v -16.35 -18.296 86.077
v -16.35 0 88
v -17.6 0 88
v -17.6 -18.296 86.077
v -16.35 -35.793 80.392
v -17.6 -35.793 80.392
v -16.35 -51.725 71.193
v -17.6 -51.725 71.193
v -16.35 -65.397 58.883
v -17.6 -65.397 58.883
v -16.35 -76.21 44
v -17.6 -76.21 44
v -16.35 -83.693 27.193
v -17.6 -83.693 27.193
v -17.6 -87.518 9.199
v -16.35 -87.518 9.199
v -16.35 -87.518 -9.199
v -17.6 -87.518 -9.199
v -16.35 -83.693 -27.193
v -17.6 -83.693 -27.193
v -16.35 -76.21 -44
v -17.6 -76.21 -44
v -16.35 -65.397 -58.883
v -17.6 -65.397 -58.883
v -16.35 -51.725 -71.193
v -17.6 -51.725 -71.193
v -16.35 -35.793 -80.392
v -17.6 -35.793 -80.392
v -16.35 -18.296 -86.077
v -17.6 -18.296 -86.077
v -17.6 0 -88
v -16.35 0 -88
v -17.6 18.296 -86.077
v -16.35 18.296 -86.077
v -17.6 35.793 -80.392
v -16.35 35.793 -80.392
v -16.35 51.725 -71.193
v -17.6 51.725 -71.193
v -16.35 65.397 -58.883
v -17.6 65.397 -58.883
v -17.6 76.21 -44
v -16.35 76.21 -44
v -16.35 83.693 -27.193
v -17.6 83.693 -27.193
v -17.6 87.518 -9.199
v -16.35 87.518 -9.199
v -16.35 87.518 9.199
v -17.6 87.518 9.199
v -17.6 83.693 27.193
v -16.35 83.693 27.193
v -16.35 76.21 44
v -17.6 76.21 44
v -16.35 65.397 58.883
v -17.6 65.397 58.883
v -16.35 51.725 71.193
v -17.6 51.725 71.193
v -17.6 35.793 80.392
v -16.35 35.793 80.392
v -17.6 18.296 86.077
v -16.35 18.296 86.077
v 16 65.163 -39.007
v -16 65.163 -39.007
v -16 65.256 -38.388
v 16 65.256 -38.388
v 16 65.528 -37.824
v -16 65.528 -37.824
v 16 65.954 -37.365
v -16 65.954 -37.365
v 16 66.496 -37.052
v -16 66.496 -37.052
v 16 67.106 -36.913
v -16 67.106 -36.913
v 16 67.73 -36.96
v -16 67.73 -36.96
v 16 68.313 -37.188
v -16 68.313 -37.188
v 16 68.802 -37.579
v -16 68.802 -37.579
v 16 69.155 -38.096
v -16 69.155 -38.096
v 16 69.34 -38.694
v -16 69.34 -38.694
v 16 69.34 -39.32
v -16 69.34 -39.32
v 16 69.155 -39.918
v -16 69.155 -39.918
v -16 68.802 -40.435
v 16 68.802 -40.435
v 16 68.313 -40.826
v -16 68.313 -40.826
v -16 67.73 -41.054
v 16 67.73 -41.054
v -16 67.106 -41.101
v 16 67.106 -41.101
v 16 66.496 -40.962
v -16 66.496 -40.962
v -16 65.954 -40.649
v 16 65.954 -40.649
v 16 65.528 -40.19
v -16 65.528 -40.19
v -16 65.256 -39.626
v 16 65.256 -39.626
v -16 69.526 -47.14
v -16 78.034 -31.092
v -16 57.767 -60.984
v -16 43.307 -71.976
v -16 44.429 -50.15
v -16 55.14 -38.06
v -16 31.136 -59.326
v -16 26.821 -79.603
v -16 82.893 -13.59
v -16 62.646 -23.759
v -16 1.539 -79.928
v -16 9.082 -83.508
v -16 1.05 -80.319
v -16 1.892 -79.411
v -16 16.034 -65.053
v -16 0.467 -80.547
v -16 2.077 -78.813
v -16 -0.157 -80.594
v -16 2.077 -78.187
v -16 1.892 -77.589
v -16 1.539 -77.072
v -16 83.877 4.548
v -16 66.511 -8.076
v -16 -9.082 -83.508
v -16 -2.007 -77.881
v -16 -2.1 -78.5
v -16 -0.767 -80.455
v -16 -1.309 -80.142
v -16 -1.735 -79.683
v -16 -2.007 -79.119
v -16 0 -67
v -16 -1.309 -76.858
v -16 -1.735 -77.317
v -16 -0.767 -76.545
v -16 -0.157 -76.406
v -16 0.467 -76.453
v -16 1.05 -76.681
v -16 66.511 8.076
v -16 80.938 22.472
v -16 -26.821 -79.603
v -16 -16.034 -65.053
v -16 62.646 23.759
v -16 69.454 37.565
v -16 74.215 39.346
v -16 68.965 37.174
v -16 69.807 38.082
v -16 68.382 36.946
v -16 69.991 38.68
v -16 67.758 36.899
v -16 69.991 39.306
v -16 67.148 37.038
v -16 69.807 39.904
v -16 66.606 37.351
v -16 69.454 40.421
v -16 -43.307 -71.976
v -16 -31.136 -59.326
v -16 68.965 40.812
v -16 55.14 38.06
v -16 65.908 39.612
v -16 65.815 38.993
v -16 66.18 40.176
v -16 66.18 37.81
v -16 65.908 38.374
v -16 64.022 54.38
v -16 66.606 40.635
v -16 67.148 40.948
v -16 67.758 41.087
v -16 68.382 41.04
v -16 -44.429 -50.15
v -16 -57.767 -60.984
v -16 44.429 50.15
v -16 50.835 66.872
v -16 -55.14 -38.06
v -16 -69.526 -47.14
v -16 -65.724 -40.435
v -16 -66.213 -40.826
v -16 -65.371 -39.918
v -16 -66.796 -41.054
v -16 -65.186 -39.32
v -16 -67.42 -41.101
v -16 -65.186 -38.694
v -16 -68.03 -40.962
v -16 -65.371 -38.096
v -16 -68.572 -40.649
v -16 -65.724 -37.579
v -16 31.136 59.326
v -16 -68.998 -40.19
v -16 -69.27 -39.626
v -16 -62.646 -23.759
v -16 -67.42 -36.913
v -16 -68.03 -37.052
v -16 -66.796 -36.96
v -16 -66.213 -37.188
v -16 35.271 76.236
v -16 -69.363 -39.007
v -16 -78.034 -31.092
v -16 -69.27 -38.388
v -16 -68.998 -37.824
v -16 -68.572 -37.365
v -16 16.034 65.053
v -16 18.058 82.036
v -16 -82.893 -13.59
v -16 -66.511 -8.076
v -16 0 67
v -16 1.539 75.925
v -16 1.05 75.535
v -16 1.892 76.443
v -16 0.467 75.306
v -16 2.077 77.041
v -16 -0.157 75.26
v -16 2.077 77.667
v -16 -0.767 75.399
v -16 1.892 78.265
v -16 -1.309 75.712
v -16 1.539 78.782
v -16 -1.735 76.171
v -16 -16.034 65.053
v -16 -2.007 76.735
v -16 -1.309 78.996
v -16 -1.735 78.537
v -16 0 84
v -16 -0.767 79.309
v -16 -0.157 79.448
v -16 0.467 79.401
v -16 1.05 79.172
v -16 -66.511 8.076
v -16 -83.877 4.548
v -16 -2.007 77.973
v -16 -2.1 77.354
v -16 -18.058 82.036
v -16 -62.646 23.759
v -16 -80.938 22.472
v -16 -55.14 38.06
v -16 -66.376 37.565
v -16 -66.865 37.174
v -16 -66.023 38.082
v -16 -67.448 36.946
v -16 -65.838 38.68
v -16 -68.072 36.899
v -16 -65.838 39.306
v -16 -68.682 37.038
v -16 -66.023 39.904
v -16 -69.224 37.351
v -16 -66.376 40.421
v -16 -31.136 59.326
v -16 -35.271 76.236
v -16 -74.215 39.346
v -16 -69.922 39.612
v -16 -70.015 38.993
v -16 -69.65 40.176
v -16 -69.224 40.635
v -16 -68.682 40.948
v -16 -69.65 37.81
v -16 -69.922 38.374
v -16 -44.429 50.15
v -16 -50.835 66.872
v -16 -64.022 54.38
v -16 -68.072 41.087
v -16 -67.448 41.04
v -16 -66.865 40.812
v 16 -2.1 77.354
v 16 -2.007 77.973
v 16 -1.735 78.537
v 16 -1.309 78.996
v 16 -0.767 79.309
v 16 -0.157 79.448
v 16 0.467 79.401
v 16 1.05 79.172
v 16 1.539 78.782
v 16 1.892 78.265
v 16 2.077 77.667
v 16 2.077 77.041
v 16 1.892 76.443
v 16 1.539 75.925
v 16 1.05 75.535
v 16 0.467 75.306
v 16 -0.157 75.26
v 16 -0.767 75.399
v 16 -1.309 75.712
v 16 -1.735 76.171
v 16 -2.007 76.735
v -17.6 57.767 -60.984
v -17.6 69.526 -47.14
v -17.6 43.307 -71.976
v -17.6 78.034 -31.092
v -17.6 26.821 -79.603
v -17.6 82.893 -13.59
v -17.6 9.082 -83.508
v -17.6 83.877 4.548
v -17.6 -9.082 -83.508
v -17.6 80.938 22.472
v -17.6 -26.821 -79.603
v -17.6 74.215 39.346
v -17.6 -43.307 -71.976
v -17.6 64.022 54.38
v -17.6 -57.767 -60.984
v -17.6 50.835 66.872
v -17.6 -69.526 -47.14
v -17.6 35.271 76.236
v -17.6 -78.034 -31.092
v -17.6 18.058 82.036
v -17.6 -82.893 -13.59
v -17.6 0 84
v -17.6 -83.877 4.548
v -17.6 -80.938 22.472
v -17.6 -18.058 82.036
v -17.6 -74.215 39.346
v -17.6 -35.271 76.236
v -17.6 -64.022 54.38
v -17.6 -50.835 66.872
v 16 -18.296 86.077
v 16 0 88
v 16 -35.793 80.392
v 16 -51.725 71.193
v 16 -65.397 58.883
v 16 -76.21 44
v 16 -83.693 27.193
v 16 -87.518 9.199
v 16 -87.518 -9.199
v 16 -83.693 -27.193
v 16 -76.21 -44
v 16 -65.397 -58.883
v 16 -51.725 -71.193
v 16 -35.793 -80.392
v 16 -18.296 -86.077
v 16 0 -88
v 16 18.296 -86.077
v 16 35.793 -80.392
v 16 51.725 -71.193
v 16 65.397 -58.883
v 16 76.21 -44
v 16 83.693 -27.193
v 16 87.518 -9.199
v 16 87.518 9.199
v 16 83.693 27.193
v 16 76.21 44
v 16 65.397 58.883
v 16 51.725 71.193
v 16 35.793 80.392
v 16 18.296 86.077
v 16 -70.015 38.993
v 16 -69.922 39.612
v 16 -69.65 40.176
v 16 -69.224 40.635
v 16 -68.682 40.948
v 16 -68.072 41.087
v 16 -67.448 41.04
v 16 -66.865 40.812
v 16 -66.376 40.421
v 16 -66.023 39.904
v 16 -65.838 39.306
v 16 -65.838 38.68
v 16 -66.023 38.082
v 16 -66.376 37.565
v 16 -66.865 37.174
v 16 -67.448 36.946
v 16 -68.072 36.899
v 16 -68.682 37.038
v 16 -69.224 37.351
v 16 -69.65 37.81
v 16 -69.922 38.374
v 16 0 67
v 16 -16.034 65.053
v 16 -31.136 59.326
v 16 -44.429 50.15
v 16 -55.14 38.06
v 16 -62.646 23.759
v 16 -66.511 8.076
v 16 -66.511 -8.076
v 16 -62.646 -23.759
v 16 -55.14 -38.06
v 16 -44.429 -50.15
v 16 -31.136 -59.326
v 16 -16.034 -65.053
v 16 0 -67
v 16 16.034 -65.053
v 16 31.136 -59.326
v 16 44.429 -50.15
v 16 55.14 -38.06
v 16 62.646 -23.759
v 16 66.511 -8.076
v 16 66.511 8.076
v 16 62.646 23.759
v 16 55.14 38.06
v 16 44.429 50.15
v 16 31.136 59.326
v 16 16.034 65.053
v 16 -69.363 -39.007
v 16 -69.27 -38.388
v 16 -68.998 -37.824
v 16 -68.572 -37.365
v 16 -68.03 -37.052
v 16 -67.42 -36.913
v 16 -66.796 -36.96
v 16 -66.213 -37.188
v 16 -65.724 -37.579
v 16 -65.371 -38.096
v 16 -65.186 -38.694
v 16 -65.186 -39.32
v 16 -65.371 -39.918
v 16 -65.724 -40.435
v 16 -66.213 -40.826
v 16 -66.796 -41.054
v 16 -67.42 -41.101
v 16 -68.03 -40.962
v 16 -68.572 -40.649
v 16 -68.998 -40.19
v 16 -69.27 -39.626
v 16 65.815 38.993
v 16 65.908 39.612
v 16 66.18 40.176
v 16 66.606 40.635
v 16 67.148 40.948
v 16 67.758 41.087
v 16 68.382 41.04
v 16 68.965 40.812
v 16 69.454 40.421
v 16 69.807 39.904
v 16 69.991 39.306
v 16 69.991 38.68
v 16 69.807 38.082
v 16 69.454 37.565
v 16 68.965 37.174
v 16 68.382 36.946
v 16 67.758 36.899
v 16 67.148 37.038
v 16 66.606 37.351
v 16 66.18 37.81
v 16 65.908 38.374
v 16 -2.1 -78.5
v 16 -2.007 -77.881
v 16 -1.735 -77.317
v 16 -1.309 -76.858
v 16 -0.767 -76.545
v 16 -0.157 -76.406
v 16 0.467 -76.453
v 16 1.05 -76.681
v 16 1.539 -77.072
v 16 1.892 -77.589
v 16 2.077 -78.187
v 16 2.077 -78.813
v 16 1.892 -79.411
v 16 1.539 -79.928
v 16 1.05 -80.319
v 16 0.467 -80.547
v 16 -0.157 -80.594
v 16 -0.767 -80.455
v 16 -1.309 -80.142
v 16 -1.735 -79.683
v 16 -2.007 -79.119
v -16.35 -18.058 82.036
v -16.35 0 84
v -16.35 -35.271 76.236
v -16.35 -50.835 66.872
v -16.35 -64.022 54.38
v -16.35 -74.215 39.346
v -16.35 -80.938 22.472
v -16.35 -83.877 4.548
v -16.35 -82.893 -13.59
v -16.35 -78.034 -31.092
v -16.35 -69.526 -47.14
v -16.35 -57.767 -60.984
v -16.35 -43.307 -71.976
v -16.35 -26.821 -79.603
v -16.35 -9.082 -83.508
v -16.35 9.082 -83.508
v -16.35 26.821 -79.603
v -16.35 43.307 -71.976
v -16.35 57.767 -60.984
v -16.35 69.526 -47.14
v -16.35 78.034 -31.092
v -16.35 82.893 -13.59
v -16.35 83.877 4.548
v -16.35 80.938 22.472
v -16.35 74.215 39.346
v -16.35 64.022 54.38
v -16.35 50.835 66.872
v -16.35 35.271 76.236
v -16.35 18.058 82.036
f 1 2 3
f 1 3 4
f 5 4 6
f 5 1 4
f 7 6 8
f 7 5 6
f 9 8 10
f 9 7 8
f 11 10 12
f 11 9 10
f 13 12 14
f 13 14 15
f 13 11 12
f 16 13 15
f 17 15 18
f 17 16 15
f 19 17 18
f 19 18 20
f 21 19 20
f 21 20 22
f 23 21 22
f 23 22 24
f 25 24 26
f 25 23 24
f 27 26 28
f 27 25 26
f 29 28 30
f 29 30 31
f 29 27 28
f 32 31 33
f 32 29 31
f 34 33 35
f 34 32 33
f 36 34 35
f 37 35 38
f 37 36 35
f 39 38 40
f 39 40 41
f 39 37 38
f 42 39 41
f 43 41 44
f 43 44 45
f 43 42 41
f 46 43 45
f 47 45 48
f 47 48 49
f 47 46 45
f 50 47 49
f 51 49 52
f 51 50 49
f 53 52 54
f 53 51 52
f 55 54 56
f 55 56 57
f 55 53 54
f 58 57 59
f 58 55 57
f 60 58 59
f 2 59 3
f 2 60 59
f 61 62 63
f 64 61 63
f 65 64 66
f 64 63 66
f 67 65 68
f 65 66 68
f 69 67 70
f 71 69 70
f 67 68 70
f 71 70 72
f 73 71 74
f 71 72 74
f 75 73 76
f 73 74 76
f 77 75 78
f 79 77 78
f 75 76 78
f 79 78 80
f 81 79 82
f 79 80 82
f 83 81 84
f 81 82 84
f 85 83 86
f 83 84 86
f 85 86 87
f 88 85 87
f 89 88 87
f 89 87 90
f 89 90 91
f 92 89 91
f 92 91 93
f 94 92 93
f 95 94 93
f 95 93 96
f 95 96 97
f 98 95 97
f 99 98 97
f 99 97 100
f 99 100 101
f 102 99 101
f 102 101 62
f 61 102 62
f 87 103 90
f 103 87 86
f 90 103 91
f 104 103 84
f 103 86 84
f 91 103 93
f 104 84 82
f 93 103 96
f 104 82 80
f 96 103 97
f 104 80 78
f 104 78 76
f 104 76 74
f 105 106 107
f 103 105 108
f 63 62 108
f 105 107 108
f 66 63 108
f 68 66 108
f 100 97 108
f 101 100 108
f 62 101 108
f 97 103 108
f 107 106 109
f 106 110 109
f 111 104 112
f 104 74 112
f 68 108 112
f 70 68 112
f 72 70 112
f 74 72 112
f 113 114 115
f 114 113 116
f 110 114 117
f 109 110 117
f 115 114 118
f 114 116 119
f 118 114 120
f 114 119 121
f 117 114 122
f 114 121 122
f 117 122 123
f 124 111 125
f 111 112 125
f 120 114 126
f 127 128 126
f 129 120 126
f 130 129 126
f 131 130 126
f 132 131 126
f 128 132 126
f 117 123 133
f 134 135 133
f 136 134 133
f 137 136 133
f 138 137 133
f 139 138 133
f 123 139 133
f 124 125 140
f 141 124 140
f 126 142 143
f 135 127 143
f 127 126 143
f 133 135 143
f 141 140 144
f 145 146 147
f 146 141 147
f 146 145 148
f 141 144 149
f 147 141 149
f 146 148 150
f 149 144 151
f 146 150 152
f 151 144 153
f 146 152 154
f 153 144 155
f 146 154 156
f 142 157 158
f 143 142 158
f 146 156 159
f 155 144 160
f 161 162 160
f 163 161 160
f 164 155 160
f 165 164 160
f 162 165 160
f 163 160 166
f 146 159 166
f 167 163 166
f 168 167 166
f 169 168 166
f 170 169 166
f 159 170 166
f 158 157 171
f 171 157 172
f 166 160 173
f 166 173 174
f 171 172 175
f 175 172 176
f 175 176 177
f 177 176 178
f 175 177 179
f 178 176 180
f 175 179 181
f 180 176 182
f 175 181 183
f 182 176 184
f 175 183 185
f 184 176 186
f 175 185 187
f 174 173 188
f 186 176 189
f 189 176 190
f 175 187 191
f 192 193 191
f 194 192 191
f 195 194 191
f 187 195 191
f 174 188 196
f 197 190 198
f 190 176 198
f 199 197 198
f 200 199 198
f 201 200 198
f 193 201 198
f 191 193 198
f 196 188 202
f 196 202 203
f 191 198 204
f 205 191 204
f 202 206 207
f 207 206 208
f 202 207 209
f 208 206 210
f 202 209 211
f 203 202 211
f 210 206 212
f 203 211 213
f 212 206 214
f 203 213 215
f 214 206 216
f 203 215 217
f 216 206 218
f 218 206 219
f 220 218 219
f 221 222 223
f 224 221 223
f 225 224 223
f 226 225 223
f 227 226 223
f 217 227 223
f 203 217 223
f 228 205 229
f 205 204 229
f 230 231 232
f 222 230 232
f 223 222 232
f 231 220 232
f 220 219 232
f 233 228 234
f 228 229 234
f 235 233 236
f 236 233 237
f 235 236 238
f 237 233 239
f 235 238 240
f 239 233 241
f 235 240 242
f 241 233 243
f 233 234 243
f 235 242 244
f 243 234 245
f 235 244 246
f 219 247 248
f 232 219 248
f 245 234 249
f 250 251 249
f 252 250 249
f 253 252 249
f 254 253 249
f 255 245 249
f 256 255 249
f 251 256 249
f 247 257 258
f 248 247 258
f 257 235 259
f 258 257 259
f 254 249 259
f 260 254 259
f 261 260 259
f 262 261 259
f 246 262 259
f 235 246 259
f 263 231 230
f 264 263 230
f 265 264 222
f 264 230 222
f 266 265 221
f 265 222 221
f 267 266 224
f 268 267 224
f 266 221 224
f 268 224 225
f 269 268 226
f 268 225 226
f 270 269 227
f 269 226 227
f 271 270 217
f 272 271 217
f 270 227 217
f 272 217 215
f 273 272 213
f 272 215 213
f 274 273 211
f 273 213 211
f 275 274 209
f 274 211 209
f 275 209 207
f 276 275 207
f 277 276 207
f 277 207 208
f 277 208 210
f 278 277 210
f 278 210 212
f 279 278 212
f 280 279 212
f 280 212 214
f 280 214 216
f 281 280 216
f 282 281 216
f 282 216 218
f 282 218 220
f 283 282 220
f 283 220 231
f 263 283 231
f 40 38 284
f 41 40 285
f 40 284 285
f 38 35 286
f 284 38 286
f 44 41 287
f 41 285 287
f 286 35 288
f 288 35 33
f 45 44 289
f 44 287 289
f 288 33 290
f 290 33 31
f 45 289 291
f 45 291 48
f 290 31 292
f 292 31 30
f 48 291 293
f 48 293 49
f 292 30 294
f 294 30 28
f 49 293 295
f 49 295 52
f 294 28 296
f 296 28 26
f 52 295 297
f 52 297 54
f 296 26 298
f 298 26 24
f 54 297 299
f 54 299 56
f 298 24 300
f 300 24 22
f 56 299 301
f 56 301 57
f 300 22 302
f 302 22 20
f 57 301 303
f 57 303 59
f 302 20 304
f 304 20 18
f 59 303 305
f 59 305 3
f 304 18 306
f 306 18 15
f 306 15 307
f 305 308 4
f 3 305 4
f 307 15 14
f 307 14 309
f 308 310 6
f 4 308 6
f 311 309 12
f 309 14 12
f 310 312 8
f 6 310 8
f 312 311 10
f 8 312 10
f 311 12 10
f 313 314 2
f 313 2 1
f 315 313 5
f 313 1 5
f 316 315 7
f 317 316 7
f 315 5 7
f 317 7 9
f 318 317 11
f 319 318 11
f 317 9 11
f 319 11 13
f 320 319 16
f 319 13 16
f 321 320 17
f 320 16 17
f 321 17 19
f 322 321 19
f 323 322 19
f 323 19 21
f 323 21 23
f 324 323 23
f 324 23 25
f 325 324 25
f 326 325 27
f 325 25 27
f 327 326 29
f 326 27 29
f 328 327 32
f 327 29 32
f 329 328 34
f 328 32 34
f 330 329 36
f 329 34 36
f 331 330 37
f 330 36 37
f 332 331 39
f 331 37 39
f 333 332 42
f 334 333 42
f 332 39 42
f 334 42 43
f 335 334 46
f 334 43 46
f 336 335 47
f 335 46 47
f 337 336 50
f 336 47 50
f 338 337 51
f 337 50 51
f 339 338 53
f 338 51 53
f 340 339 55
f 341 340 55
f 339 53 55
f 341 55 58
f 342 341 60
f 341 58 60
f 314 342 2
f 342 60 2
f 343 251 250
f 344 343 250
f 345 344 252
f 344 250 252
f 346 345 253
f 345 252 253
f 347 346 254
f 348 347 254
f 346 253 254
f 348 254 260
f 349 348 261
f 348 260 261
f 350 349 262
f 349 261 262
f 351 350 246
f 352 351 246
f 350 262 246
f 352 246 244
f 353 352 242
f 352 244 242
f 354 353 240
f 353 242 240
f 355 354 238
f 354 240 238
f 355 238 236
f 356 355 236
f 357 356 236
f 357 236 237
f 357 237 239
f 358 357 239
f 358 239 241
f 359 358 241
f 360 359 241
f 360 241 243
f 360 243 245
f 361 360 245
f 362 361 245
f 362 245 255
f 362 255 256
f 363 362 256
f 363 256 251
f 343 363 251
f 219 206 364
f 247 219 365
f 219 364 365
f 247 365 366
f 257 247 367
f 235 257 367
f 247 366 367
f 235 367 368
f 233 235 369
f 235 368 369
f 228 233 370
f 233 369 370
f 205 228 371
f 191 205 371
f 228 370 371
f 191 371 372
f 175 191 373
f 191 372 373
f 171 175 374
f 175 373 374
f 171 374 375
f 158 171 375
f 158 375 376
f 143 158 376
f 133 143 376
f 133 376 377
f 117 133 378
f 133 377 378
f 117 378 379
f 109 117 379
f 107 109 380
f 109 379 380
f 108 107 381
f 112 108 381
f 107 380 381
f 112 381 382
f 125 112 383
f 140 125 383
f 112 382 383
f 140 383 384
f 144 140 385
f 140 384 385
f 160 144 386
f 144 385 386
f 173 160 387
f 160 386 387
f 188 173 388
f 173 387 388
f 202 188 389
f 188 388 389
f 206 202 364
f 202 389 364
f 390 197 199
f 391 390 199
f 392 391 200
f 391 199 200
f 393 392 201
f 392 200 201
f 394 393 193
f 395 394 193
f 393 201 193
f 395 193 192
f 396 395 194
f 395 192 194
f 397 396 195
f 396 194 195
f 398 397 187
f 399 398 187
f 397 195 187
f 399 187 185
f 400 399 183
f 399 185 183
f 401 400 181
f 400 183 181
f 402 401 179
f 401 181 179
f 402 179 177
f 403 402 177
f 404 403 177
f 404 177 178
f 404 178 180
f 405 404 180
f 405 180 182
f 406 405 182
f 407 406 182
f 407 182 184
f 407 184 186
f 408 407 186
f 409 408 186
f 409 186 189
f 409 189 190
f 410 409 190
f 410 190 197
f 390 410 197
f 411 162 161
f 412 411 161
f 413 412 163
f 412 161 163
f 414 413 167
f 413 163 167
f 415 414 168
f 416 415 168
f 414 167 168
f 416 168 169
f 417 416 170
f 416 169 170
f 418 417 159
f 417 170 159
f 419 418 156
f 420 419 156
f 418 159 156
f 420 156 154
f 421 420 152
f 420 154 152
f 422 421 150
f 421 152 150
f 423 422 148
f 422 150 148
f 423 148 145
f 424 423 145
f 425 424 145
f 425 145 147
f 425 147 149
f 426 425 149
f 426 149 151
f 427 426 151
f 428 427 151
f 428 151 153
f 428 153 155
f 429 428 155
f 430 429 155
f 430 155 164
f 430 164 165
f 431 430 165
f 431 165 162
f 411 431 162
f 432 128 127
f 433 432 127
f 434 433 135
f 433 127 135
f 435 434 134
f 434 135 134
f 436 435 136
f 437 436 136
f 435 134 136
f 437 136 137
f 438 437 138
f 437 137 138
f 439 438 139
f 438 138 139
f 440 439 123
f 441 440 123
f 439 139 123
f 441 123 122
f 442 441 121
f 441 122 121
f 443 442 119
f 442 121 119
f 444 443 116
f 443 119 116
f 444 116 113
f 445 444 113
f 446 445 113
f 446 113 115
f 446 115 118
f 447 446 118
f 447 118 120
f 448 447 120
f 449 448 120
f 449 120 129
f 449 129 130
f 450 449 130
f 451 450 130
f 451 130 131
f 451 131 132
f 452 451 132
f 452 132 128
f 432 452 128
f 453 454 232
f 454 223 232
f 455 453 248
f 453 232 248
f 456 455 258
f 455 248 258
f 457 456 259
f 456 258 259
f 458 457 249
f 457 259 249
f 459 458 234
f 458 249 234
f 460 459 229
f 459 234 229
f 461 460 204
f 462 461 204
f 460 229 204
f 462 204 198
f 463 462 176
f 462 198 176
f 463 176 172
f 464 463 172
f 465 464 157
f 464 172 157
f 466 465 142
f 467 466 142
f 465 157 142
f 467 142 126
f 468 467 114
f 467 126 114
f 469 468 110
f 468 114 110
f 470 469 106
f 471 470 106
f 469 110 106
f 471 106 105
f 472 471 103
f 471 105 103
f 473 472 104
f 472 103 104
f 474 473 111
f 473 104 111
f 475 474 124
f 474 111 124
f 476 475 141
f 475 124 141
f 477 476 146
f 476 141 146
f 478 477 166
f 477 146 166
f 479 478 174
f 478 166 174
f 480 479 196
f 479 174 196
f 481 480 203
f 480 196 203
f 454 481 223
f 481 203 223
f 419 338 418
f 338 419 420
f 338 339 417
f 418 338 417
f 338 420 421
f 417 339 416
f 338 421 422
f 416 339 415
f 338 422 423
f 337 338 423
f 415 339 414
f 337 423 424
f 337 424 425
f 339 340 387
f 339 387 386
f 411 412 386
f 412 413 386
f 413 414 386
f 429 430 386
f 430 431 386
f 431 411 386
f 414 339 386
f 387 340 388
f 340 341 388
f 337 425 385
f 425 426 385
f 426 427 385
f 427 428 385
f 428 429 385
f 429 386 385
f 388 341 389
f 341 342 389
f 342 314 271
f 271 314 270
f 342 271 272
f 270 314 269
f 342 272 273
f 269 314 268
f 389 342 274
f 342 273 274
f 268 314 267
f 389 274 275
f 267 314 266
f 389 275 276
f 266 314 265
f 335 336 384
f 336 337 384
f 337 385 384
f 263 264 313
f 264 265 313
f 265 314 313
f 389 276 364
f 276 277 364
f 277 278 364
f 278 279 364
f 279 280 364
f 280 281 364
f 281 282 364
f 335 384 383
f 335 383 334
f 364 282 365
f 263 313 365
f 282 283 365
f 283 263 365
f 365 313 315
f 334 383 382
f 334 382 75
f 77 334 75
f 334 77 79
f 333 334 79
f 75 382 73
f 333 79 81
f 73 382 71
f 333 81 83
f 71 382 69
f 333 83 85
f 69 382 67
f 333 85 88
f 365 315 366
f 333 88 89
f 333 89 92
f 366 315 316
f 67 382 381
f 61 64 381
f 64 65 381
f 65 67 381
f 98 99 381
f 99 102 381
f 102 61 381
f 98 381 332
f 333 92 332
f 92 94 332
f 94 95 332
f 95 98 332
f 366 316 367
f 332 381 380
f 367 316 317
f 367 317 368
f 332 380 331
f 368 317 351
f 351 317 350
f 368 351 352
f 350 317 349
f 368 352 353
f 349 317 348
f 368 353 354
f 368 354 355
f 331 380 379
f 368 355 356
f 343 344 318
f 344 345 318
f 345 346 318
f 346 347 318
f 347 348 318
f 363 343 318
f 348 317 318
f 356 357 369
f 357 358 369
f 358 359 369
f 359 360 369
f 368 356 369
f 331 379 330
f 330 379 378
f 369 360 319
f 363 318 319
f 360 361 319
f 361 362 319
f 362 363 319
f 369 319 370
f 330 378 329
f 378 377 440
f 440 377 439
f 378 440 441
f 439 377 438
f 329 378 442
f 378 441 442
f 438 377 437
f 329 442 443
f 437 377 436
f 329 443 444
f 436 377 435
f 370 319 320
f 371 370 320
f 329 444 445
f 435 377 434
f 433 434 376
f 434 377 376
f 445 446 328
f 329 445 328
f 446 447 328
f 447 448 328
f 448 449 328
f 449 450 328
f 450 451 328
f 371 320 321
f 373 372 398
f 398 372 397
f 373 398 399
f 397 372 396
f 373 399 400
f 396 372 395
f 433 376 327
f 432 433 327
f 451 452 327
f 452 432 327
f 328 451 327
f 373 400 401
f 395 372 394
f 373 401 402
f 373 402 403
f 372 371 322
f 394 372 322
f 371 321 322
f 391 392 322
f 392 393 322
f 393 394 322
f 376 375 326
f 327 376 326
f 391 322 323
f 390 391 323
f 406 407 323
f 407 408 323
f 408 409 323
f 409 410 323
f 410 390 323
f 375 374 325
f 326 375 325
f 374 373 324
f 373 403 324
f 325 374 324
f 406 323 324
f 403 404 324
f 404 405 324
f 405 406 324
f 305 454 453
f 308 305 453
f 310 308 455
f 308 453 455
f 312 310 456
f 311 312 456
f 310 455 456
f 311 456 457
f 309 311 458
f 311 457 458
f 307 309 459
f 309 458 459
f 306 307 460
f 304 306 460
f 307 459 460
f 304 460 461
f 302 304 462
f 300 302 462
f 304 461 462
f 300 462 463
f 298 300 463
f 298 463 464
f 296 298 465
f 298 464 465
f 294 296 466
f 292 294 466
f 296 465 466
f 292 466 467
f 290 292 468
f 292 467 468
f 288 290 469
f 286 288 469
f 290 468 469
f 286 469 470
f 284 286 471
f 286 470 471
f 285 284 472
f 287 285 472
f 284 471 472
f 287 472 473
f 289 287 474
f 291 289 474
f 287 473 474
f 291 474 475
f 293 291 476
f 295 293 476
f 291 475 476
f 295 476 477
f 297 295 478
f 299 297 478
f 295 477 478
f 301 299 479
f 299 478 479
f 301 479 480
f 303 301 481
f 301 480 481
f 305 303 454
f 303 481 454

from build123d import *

# Parameters (mm, degrees)
F2_DEPTH = 0.7
F3_DEPTH = 0.35
F5_D     = 4.2
F6_DEPTH = 1.25


with BuildPart() as f1:
    # F0 (on Front) → F1 (revolve)
    with BuildSketch(Plane.XZ):
        Polygon((-16, 84), (-16, 67), (16, 67), (16, 84), (16.35, 84), (16.35, 88), (-16.35, 88), (-16.35, 84), align=None)
    revolve(axis=Axis((-7.2666932824, 0, 0), (1, 0, 0)))

    # F2 (cut): a face of the model
    f2_faces = [f1.faces().sort_by_distance(p)[0] for p in [
        (16.35, 0, -86.4890158698),
    ]]
    extrude(f2_faces, amount=-F2_DEPTH, mode=Mode.SUBTRACT)

    # F3 (add): a face of the model
    f3_faces = [f1.faces().sort_by_distance(p)[0] for p in [
        (15.65, 0, -86.4890158698),
    ]]
    extrude(f3_faces, amount=F3_DEPTH)

    # F5 (through all)
    with Locations(Plane.YZ.offset(16)):
        with Locations((-67.9149415737, 38.9929093129), (0, 77.3538361923), (67.9149415737, 38.9929093129), (67.2629921577, -39.0070906871), (0, -78.5), (-67.2629921577, -39.0070906871)):
            Hole(F5_D / 2)

    # F6 (add): a face of the model
    f6_faces = [f1.faces().sort_by_distance(p)[0] for p in [
        (-16.35, 0, -85.5109841302),
    ]]
    extrude(f6_faces, amount=F6_DEPTH)


solid = f1.part
